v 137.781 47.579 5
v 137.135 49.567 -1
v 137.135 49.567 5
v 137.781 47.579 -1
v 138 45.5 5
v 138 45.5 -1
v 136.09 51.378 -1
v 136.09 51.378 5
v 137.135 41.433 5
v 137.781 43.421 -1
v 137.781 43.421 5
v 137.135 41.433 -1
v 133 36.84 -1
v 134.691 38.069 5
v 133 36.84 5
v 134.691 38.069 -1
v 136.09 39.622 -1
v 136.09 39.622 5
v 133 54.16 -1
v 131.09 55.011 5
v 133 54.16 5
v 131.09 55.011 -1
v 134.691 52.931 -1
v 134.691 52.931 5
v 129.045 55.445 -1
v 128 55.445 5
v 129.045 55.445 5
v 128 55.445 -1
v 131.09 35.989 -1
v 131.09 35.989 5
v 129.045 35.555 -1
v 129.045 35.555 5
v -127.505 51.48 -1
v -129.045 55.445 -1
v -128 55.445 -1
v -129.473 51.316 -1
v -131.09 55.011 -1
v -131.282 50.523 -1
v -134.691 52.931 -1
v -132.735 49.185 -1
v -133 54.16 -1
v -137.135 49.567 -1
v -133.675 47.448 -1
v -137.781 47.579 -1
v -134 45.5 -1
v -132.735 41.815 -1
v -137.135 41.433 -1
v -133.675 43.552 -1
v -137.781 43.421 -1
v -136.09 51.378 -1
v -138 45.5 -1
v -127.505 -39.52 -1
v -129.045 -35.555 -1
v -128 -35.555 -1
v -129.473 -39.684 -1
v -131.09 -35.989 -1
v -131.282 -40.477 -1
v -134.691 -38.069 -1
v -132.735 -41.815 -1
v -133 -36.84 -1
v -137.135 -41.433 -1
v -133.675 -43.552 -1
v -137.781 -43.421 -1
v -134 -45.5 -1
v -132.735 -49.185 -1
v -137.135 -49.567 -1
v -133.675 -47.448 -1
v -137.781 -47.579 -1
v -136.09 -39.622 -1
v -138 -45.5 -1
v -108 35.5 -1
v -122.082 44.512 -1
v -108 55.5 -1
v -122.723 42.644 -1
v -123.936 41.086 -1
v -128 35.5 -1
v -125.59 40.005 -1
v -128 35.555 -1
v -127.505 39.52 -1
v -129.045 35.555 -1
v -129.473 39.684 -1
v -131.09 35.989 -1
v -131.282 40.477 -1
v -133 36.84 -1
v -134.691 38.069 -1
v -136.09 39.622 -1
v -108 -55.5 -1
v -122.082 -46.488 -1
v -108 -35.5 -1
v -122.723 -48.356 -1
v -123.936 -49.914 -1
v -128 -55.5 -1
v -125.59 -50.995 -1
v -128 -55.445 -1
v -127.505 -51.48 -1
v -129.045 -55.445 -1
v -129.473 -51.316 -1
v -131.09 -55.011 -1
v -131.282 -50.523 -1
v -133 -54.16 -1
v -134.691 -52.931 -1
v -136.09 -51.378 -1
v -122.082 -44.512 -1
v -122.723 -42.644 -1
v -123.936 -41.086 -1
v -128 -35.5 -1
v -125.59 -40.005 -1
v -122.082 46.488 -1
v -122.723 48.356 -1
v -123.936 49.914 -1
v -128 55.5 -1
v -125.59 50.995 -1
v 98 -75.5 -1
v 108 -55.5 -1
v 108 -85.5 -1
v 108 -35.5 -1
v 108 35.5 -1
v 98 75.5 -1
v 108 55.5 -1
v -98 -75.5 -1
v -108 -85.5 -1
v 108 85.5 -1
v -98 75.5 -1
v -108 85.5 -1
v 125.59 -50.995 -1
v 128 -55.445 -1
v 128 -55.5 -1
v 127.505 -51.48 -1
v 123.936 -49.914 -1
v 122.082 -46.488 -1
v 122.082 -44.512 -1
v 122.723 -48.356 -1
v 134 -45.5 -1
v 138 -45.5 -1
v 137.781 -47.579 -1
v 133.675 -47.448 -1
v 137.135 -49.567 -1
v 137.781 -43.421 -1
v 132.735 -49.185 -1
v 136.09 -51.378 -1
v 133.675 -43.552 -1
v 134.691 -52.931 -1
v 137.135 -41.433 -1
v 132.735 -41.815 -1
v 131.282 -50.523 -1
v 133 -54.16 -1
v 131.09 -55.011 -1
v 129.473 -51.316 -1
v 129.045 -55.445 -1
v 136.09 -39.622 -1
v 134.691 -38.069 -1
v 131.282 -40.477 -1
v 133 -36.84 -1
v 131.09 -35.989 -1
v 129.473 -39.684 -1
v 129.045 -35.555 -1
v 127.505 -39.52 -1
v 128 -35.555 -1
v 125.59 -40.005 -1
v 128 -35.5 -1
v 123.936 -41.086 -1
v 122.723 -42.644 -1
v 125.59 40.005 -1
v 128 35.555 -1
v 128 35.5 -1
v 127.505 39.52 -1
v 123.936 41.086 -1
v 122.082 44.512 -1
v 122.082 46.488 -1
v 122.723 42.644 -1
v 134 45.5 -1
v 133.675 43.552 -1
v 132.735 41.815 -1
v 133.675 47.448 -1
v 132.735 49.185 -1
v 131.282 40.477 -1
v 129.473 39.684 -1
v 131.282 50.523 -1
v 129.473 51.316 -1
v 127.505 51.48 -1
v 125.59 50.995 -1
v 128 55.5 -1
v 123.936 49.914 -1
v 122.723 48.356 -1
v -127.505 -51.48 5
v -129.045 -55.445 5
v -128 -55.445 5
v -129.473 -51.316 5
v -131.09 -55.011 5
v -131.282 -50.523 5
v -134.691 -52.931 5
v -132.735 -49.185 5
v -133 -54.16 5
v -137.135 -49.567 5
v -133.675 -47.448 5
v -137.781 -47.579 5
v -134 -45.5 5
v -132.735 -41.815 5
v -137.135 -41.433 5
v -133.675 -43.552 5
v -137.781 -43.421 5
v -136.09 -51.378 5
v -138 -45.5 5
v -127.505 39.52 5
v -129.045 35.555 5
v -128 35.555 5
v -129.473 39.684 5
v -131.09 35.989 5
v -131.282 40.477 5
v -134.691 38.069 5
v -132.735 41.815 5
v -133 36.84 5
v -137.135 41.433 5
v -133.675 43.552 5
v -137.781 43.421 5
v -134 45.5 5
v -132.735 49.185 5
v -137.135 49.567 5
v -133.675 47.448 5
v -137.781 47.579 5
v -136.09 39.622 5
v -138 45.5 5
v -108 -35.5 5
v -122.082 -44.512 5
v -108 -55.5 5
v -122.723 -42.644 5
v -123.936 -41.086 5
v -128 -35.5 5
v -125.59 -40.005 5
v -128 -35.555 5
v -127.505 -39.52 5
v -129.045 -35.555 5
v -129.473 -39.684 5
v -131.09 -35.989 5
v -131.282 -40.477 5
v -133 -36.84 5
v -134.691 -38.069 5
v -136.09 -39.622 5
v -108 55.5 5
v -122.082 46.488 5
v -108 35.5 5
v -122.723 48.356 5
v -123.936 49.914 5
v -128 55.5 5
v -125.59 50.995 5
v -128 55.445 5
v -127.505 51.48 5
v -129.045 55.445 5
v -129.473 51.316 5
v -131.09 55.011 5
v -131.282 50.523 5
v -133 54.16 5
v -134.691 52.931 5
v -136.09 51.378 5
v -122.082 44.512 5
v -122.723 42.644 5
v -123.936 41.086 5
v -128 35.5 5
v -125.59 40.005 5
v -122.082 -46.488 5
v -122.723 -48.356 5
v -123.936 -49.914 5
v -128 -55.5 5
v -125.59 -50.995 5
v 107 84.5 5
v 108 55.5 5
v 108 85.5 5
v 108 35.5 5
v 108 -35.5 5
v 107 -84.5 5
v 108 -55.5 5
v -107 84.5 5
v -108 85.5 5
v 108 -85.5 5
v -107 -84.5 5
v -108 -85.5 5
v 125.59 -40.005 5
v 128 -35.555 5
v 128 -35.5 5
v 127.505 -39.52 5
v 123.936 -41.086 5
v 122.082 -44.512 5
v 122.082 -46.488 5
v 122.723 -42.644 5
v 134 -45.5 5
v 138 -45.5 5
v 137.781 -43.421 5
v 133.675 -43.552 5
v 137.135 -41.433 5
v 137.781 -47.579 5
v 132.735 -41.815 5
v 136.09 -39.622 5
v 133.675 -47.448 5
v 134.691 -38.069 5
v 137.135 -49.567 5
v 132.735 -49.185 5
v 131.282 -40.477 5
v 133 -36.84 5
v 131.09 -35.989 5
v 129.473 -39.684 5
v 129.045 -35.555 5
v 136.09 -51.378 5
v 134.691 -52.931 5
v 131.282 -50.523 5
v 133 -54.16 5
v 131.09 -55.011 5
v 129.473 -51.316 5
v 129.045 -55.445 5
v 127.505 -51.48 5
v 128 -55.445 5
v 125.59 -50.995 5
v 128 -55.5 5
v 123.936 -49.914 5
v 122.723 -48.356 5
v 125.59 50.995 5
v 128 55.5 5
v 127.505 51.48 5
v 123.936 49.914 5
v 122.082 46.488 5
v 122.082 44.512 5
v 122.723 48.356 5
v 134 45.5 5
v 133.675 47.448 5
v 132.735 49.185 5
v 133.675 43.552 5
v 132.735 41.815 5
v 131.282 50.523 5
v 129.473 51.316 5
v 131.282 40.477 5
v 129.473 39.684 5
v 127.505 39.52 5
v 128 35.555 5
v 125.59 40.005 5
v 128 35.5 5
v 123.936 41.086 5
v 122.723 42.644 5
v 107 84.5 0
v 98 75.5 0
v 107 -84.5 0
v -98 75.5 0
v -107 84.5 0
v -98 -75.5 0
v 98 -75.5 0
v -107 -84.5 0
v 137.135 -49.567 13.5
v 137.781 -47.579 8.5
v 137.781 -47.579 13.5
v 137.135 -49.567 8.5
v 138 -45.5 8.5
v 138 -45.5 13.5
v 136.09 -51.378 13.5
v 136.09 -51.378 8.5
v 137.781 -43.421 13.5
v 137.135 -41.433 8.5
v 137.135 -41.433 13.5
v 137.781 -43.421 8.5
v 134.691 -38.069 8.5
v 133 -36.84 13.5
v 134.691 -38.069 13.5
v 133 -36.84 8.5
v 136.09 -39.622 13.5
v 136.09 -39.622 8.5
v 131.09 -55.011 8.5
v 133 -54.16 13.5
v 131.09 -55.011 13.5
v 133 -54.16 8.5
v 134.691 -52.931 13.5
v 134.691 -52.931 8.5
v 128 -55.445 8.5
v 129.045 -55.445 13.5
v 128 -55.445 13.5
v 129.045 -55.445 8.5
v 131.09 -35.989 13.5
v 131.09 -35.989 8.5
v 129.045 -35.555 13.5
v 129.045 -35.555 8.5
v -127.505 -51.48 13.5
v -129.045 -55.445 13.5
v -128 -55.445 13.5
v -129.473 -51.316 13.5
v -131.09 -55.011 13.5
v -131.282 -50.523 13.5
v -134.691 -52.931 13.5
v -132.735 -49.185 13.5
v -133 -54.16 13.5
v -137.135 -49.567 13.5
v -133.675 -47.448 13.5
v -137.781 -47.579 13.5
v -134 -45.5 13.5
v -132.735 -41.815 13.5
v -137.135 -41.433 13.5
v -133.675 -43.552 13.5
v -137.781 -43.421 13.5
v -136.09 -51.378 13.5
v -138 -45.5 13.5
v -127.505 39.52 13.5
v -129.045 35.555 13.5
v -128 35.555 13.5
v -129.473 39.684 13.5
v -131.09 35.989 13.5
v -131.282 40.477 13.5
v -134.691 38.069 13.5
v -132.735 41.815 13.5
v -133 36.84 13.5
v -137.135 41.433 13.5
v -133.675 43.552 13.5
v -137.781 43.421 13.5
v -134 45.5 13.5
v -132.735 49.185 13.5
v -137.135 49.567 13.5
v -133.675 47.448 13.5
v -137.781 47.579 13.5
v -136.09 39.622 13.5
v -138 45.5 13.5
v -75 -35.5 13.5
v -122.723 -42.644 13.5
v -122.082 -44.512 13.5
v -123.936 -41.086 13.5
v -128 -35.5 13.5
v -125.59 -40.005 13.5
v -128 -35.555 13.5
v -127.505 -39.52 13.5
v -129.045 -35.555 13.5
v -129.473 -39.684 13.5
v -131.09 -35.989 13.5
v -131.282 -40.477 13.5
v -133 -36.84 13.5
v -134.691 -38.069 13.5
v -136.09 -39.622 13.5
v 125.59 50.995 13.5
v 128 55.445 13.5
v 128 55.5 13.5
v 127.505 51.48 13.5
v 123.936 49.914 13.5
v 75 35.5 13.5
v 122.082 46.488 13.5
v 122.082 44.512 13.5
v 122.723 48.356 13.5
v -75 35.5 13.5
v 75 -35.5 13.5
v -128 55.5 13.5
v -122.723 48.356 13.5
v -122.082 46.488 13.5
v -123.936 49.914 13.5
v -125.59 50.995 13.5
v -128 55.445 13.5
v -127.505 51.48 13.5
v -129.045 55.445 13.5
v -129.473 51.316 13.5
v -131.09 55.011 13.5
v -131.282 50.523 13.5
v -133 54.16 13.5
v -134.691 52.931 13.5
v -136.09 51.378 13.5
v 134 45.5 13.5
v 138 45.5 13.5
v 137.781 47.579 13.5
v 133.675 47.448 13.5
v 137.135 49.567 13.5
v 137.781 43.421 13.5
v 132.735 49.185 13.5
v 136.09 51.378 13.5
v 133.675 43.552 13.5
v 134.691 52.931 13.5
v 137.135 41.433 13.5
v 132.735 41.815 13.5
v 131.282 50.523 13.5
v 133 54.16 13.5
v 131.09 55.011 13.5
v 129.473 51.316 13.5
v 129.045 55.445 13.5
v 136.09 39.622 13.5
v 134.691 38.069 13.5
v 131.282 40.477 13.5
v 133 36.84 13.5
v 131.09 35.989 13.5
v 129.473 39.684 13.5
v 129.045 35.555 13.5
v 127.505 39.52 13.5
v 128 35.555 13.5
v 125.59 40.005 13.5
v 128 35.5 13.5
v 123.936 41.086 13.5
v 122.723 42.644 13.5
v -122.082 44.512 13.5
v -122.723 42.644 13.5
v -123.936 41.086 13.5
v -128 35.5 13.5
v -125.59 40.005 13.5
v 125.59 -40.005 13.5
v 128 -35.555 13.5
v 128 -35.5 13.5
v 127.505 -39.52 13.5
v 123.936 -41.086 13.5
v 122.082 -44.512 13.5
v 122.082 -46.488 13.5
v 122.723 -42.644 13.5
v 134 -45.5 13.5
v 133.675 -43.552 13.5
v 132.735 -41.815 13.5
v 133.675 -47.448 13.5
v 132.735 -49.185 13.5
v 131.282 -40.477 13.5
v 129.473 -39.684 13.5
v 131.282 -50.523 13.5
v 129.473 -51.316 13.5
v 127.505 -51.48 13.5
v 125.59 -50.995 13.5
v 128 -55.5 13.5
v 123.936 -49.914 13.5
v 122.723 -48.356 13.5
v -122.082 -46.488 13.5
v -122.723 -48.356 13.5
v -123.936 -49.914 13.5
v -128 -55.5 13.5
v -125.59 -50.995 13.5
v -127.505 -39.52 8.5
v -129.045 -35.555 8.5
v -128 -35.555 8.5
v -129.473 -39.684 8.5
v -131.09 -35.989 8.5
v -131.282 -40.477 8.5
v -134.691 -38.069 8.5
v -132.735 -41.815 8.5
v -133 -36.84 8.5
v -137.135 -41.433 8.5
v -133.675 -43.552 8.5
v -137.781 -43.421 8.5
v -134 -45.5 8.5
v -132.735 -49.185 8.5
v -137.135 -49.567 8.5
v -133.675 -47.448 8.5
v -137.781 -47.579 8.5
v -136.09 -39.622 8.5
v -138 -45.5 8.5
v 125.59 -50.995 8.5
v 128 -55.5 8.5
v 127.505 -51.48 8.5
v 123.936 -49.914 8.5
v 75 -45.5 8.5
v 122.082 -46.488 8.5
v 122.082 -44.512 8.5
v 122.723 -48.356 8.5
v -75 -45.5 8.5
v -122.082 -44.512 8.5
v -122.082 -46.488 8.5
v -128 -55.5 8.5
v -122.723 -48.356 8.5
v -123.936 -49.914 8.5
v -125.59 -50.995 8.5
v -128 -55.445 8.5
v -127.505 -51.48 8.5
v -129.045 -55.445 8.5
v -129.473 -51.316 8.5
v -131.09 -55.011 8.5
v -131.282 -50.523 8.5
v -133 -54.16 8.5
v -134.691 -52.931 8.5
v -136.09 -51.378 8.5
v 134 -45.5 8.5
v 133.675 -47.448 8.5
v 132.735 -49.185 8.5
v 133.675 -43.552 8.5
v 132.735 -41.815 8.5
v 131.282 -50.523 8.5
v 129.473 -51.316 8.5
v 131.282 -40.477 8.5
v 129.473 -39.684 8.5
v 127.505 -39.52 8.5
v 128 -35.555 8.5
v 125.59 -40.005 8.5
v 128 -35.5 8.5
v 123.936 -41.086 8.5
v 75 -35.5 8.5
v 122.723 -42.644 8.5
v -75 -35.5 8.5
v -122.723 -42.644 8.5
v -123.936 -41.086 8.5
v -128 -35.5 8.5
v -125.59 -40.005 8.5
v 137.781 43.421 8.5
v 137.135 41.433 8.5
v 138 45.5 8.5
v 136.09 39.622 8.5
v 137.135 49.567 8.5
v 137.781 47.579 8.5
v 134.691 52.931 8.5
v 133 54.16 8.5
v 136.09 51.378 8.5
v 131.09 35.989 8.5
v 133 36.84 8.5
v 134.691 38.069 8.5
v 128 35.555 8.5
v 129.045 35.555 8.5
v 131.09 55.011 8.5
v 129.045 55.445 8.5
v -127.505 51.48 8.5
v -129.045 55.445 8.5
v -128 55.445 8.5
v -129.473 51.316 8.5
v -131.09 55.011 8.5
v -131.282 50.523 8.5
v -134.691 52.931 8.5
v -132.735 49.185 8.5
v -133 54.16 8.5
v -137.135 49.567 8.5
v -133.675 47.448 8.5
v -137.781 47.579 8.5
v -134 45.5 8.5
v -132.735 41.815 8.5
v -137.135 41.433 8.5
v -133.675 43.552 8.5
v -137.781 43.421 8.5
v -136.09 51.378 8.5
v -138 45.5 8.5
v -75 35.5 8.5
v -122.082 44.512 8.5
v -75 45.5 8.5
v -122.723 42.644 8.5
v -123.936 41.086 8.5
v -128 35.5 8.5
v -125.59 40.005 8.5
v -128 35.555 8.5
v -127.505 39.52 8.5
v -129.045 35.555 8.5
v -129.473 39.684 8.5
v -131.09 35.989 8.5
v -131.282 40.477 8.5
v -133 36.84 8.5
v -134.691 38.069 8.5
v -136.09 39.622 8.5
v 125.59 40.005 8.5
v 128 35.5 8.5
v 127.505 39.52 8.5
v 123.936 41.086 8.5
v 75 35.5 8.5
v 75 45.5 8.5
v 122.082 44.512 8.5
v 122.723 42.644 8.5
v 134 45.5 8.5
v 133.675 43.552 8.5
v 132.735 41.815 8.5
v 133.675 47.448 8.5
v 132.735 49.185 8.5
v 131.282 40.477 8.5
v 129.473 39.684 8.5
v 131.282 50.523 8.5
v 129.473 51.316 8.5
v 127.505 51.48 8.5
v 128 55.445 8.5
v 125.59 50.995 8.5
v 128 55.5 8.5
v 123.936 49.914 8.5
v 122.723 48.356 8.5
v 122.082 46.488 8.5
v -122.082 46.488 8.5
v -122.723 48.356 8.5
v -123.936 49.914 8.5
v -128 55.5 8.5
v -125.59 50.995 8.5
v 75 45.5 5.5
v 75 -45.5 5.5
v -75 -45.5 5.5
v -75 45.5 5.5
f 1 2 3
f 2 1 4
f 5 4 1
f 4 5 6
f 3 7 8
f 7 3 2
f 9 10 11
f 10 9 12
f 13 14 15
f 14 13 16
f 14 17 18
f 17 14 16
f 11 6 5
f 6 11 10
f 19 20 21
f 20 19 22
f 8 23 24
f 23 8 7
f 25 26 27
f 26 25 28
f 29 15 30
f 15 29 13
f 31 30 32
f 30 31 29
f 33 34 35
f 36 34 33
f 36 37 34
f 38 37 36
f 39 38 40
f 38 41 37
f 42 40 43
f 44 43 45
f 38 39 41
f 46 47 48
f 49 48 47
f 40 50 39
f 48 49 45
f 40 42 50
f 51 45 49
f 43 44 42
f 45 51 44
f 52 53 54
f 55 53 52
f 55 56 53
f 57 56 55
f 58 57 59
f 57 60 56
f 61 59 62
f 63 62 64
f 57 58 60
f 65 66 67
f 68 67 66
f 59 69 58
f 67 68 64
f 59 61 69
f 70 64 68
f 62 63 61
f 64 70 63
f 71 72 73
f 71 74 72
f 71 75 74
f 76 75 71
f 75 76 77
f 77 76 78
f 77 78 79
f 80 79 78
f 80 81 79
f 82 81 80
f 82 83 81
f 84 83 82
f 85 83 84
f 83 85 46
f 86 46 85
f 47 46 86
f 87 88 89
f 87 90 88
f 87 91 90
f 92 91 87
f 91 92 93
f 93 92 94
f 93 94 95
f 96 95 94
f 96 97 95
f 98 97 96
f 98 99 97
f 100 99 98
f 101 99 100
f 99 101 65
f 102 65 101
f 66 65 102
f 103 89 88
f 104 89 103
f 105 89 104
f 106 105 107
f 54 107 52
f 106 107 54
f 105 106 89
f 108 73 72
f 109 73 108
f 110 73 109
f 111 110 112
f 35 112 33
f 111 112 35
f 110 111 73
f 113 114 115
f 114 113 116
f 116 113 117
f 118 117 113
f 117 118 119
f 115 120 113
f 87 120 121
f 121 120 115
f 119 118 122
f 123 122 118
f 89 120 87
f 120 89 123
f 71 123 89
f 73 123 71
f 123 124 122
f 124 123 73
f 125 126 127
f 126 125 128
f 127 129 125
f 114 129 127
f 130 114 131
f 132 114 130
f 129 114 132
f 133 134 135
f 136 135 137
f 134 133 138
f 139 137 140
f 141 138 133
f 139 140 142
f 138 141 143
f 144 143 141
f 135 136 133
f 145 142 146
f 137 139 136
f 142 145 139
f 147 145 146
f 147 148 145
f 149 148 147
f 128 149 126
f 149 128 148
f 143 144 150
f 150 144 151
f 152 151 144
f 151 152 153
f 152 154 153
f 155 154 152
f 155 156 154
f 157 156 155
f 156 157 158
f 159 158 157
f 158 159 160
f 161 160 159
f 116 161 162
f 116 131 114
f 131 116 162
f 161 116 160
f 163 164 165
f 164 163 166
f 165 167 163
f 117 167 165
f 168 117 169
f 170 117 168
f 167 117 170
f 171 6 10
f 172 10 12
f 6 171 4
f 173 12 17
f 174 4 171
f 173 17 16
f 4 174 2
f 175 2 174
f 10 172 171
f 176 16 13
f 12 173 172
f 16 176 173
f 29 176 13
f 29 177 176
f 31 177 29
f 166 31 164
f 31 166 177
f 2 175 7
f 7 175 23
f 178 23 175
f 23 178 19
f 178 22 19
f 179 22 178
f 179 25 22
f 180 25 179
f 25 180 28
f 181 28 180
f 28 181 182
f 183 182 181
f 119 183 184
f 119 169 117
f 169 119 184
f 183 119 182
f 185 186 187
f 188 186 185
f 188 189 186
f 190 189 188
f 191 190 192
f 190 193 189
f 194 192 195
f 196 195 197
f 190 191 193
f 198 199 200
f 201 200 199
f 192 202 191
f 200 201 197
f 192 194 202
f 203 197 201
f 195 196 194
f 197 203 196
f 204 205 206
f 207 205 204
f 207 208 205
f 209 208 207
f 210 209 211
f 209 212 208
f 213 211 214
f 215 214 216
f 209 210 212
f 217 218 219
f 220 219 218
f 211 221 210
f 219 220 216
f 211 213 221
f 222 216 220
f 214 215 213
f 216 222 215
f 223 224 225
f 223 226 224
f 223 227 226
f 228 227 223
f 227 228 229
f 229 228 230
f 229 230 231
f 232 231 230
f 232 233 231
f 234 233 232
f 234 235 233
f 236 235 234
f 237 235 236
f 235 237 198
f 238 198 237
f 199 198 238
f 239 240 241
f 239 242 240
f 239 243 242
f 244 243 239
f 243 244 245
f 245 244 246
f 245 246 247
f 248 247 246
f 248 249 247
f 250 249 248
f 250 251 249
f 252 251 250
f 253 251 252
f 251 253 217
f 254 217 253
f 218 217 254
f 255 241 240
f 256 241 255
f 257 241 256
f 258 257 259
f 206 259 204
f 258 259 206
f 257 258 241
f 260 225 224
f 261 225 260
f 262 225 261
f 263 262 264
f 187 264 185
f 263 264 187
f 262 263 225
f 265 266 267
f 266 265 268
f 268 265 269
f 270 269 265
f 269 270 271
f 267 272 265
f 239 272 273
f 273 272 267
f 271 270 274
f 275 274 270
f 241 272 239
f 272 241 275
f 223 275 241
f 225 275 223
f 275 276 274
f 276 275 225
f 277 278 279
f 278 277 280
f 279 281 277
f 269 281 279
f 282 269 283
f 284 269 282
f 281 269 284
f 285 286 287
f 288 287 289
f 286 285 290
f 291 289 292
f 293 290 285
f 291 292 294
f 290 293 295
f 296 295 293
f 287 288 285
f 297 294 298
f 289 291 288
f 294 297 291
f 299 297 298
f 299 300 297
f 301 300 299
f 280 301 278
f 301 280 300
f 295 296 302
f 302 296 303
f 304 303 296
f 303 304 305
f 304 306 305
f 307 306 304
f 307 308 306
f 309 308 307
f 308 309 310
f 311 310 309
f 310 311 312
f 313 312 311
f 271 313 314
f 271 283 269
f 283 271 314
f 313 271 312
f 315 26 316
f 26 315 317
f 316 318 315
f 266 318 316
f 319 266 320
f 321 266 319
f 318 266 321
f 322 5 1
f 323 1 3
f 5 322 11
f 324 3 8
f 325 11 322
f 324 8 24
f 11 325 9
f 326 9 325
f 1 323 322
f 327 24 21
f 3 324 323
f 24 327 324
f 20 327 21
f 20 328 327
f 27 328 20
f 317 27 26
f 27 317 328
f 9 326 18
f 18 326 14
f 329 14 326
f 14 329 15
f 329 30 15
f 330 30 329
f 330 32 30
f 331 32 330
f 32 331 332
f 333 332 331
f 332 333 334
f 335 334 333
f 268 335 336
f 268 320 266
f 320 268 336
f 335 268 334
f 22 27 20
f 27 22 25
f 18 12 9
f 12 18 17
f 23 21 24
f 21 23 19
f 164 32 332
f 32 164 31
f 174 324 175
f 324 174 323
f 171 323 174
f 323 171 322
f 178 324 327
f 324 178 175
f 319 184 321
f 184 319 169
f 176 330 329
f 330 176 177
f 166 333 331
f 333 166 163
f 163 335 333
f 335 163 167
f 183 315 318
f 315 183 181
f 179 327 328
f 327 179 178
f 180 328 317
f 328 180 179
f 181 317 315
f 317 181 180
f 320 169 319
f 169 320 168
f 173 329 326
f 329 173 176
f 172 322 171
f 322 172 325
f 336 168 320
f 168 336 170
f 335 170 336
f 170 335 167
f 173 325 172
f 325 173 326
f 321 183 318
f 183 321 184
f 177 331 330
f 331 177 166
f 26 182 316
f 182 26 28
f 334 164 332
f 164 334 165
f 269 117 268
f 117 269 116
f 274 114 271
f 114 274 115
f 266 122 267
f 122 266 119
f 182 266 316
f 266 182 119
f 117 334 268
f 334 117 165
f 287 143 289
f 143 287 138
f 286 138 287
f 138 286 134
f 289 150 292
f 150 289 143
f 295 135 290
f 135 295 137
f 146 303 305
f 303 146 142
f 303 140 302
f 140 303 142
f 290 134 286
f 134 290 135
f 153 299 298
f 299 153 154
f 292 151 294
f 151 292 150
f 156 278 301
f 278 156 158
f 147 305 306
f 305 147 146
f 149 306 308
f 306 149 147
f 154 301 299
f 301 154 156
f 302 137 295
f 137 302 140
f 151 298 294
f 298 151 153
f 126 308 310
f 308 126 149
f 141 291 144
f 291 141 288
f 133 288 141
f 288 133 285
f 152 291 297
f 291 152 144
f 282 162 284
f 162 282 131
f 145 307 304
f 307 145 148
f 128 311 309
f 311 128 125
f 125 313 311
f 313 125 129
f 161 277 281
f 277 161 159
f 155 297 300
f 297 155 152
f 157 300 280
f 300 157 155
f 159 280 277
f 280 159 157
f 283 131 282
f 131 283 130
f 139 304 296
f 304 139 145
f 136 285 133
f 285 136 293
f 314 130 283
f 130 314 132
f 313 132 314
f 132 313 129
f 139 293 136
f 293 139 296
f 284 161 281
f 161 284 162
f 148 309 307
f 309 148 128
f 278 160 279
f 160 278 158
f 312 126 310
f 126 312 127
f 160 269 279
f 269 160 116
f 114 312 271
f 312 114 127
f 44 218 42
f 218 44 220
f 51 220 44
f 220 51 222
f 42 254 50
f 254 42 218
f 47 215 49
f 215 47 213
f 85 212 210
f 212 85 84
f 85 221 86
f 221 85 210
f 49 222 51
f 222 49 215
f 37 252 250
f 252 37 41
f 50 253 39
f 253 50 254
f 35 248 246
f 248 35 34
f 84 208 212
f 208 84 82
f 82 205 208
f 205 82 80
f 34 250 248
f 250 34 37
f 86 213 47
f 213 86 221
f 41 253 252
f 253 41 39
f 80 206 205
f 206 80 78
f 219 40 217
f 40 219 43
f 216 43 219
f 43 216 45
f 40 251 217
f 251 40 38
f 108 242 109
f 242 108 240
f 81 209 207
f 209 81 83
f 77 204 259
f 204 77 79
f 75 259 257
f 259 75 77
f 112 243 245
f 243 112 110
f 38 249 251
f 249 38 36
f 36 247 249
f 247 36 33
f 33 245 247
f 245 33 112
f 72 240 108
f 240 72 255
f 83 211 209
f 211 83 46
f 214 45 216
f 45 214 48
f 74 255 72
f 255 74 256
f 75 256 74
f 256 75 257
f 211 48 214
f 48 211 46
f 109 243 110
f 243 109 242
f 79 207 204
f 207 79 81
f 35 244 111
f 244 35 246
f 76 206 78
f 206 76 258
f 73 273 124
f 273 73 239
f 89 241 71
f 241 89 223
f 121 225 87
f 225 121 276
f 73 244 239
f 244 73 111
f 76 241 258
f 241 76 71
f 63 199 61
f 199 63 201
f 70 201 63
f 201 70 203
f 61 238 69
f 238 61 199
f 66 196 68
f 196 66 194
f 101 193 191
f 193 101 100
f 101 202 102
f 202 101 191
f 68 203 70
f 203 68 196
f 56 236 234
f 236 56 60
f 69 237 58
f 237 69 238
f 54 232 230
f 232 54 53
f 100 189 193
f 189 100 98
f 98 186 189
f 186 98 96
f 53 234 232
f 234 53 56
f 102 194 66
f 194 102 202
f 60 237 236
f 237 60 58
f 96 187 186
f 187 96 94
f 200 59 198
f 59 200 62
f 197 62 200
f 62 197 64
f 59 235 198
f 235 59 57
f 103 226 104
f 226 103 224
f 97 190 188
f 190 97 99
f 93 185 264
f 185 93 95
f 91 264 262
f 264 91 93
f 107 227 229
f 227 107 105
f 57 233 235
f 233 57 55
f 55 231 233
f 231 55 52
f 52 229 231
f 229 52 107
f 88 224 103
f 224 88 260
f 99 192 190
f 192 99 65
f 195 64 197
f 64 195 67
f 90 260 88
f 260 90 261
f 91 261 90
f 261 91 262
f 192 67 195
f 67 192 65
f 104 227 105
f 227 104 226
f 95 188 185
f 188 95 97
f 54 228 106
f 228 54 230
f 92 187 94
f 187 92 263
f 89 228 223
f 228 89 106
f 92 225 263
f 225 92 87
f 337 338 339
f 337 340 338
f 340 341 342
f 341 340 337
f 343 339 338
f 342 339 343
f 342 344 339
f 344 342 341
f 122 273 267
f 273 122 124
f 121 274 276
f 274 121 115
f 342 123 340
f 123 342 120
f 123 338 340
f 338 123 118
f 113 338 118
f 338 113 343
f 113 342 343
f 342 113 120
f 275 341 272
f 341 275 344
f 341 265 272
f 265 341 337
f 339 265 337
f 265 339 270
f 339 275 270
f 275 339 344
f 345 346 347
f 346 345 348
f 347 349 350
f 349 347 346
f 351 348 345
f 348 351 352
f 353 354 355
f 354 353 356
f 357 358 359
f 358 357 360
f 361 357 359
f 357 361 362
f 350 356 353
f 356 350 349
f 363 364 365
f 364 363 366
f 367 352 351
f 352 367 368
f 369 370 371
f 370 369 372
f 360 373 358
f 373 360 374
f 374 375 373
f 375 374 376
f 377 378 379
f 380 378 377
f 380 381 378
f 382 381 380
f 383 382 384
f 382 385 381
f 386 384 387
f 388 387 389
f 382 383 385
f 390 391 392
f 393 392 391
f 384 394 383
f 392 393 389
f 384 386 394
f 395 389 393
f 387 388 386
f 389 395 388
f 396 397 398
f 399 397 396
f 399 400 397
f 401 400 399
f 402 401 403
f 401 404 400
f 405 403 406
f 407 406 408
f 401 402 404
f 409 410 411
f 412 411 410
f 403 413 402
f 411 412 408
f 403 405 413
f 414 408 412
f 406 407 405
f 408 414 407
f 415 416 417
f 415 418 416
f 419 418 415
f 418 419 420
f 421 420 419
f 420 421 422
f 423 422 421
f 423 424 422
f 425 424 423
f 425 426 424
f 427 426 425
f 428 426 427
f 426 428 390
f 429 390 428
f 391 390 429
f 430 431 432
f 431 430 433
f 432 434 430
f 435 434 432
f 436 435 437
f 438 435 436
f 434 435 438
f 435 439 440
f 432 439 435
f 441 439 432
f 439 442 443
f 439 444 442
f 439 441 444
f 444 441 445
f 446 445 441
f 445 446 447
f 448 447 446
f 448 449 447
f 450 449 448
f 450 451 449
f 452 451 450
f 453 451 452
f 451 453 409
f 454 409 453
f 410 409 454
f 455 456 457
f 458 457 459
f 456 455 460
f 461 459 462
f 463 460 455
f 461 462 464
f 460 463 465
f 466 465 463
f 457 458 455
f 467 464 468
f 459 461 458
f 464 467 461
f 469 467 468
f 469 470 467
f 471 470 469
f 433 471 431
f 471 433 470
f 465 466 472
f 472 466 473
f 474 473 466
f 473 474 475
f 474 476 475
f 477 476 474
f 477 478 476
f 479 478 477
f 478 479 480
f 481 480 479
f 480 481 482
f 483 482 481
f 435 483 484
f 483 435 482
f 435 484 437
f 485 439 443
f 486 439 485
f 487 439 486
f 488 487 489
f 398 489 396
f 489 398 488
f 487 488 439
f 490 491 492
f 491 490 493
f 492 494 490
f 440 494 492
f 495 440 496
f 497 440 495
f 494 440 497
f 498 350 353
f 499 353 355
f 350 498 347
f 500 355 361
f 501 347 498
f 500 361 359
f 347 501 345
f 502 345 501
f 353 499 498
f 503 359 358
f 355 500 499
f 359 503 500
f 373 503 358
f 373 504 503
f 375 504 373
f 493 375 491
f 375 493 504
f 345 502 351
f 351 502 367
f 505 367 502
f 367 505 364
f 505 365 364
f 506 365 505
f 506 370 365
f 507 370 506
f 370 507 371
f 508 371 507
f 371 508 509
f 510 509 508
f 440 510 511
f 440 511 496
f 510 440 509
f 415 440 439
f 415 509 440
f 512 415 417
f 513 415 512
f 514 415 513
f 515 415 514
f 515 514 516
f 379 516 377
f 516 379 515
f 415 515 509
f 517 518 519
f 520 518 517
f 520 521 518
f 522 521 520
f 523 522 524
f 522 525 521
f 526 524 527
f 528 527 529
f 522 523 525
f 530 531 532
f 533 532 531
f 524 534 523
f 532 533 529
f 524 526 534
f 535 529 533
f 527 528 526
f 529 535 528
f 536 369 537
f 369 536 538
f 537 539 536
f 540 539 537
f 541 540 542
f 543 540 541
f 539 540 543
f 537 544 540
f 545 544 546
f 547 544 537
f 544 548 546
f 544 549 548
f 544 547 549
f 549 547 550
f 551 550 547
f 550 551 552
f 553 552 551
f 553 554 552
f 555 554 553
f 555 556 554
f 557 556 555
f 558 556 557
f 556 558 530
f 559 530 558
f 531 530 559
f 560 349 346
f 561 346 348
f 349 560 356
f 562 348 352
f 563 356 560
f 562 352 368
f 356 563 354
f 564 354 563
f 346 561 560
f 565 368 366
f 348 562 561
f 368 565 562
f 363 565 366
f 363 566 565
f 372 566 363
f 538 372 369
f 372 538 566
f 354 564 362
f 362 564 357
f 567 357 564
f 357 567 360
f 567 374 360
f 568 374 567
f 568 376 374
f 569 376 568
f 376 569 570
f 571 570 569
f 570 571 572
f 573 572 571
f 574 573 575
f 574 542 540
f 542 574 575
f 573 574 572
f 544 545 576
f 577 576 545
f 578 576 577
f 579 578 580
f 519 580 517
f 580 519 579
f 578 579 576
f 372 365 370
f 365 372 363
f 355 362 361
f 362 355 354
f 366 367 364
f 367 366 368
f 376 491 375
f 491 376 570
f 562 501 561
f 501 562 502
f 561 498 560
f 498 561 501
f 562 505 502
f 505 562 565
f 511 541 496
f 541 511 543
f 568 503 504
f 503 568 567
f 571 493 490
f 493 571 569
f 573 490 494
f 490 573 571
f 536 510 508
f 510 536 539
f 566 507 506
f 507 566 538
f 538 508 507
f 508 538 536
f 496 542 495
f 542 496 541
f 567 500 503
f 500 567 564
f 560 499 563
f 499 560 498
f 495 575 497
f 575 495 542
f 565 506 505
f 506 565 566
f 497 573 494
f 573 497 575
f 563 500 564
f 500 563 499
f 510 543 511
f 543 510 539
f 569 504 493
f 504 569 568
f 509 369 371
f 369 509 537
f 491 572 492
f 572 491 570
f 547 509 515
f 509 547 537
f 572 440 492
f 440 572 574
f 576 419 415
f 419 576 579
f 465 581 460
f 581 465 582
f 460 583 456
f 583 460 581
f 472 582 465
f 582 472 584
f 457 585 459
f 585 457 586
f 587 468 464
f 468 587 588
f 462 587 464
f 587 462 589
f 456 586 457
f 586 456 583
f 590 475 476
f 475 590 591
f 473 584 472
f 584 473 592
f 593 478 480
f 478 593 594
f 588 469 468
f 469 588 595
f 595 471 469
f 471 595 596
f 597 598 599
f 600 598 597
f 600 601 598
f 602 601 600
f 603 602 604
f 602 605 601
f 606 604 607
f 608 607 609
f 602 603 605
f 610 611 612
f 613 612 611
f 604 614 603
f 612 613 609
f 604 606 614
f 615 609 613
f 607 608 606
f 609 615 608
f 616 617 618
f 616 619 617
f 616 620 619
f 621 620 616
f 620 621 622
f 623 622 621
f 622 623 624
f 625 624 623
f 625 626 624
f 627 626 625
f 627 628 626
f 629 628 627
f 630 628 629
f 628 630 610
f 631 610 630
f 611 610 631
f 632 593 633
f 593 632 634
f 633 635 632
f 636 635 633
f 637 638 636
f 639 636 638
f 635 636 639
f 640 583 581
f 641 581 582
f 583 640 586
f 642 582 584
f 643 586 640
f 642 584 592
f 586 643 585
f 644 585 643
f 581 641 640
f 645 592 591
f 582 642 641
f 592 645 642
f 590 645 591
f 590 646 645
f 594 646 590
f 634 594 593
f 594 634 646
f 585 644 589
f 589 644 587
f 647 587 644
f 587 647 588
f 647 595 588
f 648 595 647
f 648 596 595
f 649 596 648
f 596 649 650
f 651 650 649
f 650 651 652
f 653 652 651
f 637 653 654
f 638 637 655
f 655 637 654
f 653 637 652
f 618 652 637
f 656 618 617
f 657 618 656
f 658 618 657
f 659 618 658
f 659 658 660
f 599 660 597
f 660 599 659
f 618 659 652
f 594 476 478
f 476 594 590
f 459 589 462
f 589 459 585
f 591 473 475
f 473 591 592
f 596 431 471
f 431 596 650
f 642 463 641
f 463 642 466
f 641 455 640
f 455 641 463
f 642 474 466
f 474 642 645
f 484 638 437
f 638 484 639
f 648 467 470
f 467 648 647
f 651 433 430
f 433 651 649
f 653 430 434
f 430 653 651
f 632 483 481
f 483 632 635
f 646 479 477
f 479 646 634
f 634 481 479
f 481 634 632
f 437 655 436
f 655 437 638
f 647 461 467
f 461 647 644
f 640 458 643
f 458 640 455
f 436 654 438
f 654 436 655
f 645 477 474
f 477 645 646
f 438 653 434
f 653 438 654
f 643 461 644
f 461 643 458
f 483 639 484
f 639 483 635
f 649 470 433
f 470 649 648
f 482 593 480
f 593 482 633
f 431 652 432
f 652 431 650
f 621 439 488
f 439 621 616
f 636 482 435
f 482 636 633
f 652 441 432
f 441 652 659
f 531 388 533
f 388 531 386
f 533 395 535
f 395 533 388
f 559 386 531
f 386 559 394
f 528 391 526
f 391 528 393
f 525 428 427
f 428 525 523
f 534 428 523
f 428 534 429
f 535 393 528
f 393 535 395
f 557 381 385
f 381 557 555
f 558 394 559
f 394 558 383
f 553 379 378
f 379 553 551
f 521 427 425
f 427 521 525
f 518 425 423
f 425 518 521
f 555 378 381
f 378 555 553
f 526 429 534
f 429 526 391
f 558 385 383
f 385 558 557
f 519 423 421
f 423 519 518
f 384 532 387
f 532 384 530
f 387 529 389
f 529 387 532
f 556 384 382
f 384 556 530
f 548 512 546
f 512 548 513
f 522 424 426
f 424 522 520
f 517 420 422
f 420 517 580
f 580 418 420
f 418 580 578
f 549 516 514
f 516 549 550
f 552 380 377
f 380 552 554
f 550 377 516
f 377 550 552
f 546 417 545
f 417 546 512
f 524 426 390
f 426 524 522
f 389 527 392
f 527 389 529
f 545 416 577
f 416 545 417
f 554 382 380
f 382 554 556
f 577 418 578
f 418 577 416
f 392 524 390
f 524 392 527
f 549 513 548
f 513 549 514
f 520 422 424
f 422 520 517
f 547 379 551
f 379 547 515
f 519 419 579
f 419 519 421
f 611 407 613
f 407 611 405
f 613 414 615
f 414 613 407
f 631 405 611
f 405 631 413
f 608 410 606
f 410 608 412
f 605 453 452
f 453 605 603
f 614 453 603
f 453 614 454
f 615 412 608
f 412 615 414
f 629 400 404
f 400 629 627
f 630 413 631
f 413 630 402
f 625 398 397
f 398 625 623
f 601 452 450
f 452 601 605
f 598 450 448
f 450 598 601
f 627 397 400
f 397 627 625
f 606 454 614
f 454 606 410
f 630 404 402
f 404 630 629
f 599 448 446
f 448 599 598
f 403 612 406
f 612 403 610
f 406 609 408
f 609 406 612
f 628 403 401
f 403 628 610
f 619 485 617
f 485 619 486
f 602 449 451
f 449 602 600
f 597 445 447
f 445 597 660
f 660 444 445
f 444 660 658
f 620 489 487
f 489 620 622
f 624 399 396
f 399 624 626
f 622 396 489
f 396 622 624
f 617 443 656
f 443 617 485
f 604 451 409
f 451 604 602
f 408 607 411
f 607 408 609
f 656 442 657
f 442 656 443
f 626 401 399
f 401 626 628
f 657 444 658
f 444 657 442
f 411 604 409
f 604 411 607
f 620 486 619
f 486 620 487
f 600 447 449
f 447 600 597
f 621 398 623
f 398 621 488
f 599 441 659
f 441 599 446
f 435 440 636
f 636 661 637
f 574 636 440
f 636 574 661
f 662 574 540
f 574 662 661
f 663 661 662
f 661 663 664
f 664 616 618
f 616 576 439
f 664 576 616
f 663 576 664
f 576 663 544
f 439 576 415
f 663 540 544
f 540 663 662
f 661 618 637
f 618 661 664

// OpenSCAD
//  hex_screw(10,4,55,30,1.5,2,15,8,0,0);
// Screw: http://www.thingiverse.com/thing:8796

// Inner Dimensions
length = 215;
width = 170;
depth = 4;

sides_thickness = 1;

// Lip
front_lip = 10;
lip_thickness = 1;

// Screw Holders
screw_holder_length = 30;
screw_holder_width = 20;
screw_diameter = 10;
screw_holder_offset = 40;

// Magnet Holder
magnet_holder_thickness = 5;

// Magnet Plate
magnet_plate_length = 150;
magnet_plate_padding = 3;

// Generated Dimensions
outer_length = length + sides_thickness;
outer_width = width + sides_thickness;
outer_depth = depth + sides_thickness;

c_top_left  = [- ( outer_length/2 ), outer_width/2];
c_top_right = [ outer_length/2, outer_width/2];
c_bottom_left = [- ( outer_length/2 ), - outer_width/2];
c_bottom_right = [ outer_length/2, - outer_width/2];

screw_holder_top_left  = [- ( outer_length/2 ), (outer_width/2 - screw_holder_offset)];
screw_holder_top_right = [ outer_length/2, (outer_width/2 - screw_holder_offset)];
screw_holder_bottom_left = [- ( outer_length/2 ), - (outer_width/2 - screw_holder_offset)];
screw_holder_bottom_right = [ outer_length/2, - (outer_width/2 - screw_holder_offset)];


base_plate();

translate([0,0,outer_depth+lip_thickness+magnet_holder_thickness])
rotate([180,0,0])
magnet_holder();

module magnet_holder(){
    union(){
        // Screw Holders 
        translate([screw_holder_top_right[0],screw_holder_top_right[1],0])
            screw_holder(screw_holder_length, screw_holder_width, screw_diameter+2, magnet_holder_thickness);
        translate([screw_holder_bottom_right[0],screw_holder_bottom_right[1],0])
            screw_holder(screw_holder_length, screw_holder_width, screw_diameter+2, magnet_holder_thickness);
        translate([screw_holder_top_left[0],screw_holder_top_left[1],0])
            mirror([1,0,0])
            screw_holder(screw_holder_length, screw_holder_width, screw_diameter+2, magnet_holder_thickness);
        translate([screw_holder_bottom_left[0],screw_holder_bottom_left[1],0])
            mirror([1,0,0])
            screw_holder(screw_holder_length, screw_holder_width, screw_diameter+2, magnet_holder_thickness);
        
        // Arms
        translate([0,screw_holder_top_right[1],0])
            cube(size=[outer_length, screw_holder_width, magnet_holder_thickness], center=true);
        translate([0,screw_holder_bottom_right[1],0])
            cube(size=[outer_length, screw_holder_width, magnet_holder_thickness], center=true);
        
        // Plate
        translate([0,0,magnet_plate_padding/2])
            cube(size=[magnet_plate_length, outer_width-2*screw_holder_offset, magnet_holder_thickness+magnet_plate_padding], center=true);

    }
}

module base_plate(){
    union(){
        translate([0,0,-lip_thickness/2]){
            linear_extrude(center=true, height = lip_thickness){
                lip();
            }
        }
        
        translate([0,0,outer_depth/2]){
            linear_extrude(center=true, height = outer_depth){
                sides();
            }
        }
        // Screw Holders 
        translate([screw_holder_top_right[0],screw_holder_top_right[1],(outer_depth+lip_thickness)/2-lip_thickness])
            screw_holder(screw_holder_length, screw_holder_width, screw_diameter+2, outer_depth+lip_thickness);
        translate([screw_holder_bottom_right[0],screw_holder_bottom_right[1],(outer_depth+lip_thickness)/2-lip_thickness])
            screw_holder(screw_holder_length, screw_holder_width, screw_diameter+2, outer_depth+lip_thickness);
        translate([screw_holder_top_left[0],screw_holder_top_left[1],(outer_depth+lip_thickness)/2-lip_thickness])
            mirror([1,0,0])
            screw_holder(screw_holder_length, screw_holder_width, screw_diameter+2, outer_depth+lip_thickness);
        translate([screw_holder_bottom_left[0],screw_holder_bottom_left[1],(outer_depth+lip_thickness)/2-lip_thickness])
            mirror([1,0,0])
            screw_holder(screw_holder_length, screw_holder_width, screw_diameter+2, outer_depth+lip_thickness);
    }
}
module lip(){
    square_ring(thickness = front_lip);
}

module sides(){
    square_ring(thickness = sides_thickness);
}

module screw_holder(length, width, inner_diameter, h) {
    translate([length-width/2,0,0])
    union(){
        difference() {
            cylinder(r = width/2, h = h, center=true);
            translate([ 0, 0, -1 ]) cylinder(r = inner_diameter/2, h = h+2, center=true);
        }
        difference(){
            translate([-width/2,0,0]){
                cube(center = true, size=[length-width/2,width,h], center=true);
            }
            translate([ 0, 0, -1 ]) cylinder(r = width/2, h = h+2, center=true);
        }
    }
}

module square_ring(thickness){
    
    c_top_left_inner  = [- (outer_length/2 - thickness), (outer_width/2 - thickness)];
    c_top_right_inner = [ outer_length/2 - thickness, (outer_width/2 - thickness)];
    c_bottom_left_inner = [- (outer_length/2 - thickness), - (outer_width/2 - thickness)];
    c_bottom_right_inner = [ outer_length/2 - thickness, - (outer_width/2 - thickness)];
    
    polygon(
        points=[
            c_top_left,
            c_top_right,
            c_bottom_right,
            c_bottom_left,
    
            c_top_left_inner,
            c_top_right_inner,
            c_bottom_right_inner,
            c_bottom_left_inner,

        ],
        paths=[[0,1,2,3],[4,5,6,7]]
    );
}
